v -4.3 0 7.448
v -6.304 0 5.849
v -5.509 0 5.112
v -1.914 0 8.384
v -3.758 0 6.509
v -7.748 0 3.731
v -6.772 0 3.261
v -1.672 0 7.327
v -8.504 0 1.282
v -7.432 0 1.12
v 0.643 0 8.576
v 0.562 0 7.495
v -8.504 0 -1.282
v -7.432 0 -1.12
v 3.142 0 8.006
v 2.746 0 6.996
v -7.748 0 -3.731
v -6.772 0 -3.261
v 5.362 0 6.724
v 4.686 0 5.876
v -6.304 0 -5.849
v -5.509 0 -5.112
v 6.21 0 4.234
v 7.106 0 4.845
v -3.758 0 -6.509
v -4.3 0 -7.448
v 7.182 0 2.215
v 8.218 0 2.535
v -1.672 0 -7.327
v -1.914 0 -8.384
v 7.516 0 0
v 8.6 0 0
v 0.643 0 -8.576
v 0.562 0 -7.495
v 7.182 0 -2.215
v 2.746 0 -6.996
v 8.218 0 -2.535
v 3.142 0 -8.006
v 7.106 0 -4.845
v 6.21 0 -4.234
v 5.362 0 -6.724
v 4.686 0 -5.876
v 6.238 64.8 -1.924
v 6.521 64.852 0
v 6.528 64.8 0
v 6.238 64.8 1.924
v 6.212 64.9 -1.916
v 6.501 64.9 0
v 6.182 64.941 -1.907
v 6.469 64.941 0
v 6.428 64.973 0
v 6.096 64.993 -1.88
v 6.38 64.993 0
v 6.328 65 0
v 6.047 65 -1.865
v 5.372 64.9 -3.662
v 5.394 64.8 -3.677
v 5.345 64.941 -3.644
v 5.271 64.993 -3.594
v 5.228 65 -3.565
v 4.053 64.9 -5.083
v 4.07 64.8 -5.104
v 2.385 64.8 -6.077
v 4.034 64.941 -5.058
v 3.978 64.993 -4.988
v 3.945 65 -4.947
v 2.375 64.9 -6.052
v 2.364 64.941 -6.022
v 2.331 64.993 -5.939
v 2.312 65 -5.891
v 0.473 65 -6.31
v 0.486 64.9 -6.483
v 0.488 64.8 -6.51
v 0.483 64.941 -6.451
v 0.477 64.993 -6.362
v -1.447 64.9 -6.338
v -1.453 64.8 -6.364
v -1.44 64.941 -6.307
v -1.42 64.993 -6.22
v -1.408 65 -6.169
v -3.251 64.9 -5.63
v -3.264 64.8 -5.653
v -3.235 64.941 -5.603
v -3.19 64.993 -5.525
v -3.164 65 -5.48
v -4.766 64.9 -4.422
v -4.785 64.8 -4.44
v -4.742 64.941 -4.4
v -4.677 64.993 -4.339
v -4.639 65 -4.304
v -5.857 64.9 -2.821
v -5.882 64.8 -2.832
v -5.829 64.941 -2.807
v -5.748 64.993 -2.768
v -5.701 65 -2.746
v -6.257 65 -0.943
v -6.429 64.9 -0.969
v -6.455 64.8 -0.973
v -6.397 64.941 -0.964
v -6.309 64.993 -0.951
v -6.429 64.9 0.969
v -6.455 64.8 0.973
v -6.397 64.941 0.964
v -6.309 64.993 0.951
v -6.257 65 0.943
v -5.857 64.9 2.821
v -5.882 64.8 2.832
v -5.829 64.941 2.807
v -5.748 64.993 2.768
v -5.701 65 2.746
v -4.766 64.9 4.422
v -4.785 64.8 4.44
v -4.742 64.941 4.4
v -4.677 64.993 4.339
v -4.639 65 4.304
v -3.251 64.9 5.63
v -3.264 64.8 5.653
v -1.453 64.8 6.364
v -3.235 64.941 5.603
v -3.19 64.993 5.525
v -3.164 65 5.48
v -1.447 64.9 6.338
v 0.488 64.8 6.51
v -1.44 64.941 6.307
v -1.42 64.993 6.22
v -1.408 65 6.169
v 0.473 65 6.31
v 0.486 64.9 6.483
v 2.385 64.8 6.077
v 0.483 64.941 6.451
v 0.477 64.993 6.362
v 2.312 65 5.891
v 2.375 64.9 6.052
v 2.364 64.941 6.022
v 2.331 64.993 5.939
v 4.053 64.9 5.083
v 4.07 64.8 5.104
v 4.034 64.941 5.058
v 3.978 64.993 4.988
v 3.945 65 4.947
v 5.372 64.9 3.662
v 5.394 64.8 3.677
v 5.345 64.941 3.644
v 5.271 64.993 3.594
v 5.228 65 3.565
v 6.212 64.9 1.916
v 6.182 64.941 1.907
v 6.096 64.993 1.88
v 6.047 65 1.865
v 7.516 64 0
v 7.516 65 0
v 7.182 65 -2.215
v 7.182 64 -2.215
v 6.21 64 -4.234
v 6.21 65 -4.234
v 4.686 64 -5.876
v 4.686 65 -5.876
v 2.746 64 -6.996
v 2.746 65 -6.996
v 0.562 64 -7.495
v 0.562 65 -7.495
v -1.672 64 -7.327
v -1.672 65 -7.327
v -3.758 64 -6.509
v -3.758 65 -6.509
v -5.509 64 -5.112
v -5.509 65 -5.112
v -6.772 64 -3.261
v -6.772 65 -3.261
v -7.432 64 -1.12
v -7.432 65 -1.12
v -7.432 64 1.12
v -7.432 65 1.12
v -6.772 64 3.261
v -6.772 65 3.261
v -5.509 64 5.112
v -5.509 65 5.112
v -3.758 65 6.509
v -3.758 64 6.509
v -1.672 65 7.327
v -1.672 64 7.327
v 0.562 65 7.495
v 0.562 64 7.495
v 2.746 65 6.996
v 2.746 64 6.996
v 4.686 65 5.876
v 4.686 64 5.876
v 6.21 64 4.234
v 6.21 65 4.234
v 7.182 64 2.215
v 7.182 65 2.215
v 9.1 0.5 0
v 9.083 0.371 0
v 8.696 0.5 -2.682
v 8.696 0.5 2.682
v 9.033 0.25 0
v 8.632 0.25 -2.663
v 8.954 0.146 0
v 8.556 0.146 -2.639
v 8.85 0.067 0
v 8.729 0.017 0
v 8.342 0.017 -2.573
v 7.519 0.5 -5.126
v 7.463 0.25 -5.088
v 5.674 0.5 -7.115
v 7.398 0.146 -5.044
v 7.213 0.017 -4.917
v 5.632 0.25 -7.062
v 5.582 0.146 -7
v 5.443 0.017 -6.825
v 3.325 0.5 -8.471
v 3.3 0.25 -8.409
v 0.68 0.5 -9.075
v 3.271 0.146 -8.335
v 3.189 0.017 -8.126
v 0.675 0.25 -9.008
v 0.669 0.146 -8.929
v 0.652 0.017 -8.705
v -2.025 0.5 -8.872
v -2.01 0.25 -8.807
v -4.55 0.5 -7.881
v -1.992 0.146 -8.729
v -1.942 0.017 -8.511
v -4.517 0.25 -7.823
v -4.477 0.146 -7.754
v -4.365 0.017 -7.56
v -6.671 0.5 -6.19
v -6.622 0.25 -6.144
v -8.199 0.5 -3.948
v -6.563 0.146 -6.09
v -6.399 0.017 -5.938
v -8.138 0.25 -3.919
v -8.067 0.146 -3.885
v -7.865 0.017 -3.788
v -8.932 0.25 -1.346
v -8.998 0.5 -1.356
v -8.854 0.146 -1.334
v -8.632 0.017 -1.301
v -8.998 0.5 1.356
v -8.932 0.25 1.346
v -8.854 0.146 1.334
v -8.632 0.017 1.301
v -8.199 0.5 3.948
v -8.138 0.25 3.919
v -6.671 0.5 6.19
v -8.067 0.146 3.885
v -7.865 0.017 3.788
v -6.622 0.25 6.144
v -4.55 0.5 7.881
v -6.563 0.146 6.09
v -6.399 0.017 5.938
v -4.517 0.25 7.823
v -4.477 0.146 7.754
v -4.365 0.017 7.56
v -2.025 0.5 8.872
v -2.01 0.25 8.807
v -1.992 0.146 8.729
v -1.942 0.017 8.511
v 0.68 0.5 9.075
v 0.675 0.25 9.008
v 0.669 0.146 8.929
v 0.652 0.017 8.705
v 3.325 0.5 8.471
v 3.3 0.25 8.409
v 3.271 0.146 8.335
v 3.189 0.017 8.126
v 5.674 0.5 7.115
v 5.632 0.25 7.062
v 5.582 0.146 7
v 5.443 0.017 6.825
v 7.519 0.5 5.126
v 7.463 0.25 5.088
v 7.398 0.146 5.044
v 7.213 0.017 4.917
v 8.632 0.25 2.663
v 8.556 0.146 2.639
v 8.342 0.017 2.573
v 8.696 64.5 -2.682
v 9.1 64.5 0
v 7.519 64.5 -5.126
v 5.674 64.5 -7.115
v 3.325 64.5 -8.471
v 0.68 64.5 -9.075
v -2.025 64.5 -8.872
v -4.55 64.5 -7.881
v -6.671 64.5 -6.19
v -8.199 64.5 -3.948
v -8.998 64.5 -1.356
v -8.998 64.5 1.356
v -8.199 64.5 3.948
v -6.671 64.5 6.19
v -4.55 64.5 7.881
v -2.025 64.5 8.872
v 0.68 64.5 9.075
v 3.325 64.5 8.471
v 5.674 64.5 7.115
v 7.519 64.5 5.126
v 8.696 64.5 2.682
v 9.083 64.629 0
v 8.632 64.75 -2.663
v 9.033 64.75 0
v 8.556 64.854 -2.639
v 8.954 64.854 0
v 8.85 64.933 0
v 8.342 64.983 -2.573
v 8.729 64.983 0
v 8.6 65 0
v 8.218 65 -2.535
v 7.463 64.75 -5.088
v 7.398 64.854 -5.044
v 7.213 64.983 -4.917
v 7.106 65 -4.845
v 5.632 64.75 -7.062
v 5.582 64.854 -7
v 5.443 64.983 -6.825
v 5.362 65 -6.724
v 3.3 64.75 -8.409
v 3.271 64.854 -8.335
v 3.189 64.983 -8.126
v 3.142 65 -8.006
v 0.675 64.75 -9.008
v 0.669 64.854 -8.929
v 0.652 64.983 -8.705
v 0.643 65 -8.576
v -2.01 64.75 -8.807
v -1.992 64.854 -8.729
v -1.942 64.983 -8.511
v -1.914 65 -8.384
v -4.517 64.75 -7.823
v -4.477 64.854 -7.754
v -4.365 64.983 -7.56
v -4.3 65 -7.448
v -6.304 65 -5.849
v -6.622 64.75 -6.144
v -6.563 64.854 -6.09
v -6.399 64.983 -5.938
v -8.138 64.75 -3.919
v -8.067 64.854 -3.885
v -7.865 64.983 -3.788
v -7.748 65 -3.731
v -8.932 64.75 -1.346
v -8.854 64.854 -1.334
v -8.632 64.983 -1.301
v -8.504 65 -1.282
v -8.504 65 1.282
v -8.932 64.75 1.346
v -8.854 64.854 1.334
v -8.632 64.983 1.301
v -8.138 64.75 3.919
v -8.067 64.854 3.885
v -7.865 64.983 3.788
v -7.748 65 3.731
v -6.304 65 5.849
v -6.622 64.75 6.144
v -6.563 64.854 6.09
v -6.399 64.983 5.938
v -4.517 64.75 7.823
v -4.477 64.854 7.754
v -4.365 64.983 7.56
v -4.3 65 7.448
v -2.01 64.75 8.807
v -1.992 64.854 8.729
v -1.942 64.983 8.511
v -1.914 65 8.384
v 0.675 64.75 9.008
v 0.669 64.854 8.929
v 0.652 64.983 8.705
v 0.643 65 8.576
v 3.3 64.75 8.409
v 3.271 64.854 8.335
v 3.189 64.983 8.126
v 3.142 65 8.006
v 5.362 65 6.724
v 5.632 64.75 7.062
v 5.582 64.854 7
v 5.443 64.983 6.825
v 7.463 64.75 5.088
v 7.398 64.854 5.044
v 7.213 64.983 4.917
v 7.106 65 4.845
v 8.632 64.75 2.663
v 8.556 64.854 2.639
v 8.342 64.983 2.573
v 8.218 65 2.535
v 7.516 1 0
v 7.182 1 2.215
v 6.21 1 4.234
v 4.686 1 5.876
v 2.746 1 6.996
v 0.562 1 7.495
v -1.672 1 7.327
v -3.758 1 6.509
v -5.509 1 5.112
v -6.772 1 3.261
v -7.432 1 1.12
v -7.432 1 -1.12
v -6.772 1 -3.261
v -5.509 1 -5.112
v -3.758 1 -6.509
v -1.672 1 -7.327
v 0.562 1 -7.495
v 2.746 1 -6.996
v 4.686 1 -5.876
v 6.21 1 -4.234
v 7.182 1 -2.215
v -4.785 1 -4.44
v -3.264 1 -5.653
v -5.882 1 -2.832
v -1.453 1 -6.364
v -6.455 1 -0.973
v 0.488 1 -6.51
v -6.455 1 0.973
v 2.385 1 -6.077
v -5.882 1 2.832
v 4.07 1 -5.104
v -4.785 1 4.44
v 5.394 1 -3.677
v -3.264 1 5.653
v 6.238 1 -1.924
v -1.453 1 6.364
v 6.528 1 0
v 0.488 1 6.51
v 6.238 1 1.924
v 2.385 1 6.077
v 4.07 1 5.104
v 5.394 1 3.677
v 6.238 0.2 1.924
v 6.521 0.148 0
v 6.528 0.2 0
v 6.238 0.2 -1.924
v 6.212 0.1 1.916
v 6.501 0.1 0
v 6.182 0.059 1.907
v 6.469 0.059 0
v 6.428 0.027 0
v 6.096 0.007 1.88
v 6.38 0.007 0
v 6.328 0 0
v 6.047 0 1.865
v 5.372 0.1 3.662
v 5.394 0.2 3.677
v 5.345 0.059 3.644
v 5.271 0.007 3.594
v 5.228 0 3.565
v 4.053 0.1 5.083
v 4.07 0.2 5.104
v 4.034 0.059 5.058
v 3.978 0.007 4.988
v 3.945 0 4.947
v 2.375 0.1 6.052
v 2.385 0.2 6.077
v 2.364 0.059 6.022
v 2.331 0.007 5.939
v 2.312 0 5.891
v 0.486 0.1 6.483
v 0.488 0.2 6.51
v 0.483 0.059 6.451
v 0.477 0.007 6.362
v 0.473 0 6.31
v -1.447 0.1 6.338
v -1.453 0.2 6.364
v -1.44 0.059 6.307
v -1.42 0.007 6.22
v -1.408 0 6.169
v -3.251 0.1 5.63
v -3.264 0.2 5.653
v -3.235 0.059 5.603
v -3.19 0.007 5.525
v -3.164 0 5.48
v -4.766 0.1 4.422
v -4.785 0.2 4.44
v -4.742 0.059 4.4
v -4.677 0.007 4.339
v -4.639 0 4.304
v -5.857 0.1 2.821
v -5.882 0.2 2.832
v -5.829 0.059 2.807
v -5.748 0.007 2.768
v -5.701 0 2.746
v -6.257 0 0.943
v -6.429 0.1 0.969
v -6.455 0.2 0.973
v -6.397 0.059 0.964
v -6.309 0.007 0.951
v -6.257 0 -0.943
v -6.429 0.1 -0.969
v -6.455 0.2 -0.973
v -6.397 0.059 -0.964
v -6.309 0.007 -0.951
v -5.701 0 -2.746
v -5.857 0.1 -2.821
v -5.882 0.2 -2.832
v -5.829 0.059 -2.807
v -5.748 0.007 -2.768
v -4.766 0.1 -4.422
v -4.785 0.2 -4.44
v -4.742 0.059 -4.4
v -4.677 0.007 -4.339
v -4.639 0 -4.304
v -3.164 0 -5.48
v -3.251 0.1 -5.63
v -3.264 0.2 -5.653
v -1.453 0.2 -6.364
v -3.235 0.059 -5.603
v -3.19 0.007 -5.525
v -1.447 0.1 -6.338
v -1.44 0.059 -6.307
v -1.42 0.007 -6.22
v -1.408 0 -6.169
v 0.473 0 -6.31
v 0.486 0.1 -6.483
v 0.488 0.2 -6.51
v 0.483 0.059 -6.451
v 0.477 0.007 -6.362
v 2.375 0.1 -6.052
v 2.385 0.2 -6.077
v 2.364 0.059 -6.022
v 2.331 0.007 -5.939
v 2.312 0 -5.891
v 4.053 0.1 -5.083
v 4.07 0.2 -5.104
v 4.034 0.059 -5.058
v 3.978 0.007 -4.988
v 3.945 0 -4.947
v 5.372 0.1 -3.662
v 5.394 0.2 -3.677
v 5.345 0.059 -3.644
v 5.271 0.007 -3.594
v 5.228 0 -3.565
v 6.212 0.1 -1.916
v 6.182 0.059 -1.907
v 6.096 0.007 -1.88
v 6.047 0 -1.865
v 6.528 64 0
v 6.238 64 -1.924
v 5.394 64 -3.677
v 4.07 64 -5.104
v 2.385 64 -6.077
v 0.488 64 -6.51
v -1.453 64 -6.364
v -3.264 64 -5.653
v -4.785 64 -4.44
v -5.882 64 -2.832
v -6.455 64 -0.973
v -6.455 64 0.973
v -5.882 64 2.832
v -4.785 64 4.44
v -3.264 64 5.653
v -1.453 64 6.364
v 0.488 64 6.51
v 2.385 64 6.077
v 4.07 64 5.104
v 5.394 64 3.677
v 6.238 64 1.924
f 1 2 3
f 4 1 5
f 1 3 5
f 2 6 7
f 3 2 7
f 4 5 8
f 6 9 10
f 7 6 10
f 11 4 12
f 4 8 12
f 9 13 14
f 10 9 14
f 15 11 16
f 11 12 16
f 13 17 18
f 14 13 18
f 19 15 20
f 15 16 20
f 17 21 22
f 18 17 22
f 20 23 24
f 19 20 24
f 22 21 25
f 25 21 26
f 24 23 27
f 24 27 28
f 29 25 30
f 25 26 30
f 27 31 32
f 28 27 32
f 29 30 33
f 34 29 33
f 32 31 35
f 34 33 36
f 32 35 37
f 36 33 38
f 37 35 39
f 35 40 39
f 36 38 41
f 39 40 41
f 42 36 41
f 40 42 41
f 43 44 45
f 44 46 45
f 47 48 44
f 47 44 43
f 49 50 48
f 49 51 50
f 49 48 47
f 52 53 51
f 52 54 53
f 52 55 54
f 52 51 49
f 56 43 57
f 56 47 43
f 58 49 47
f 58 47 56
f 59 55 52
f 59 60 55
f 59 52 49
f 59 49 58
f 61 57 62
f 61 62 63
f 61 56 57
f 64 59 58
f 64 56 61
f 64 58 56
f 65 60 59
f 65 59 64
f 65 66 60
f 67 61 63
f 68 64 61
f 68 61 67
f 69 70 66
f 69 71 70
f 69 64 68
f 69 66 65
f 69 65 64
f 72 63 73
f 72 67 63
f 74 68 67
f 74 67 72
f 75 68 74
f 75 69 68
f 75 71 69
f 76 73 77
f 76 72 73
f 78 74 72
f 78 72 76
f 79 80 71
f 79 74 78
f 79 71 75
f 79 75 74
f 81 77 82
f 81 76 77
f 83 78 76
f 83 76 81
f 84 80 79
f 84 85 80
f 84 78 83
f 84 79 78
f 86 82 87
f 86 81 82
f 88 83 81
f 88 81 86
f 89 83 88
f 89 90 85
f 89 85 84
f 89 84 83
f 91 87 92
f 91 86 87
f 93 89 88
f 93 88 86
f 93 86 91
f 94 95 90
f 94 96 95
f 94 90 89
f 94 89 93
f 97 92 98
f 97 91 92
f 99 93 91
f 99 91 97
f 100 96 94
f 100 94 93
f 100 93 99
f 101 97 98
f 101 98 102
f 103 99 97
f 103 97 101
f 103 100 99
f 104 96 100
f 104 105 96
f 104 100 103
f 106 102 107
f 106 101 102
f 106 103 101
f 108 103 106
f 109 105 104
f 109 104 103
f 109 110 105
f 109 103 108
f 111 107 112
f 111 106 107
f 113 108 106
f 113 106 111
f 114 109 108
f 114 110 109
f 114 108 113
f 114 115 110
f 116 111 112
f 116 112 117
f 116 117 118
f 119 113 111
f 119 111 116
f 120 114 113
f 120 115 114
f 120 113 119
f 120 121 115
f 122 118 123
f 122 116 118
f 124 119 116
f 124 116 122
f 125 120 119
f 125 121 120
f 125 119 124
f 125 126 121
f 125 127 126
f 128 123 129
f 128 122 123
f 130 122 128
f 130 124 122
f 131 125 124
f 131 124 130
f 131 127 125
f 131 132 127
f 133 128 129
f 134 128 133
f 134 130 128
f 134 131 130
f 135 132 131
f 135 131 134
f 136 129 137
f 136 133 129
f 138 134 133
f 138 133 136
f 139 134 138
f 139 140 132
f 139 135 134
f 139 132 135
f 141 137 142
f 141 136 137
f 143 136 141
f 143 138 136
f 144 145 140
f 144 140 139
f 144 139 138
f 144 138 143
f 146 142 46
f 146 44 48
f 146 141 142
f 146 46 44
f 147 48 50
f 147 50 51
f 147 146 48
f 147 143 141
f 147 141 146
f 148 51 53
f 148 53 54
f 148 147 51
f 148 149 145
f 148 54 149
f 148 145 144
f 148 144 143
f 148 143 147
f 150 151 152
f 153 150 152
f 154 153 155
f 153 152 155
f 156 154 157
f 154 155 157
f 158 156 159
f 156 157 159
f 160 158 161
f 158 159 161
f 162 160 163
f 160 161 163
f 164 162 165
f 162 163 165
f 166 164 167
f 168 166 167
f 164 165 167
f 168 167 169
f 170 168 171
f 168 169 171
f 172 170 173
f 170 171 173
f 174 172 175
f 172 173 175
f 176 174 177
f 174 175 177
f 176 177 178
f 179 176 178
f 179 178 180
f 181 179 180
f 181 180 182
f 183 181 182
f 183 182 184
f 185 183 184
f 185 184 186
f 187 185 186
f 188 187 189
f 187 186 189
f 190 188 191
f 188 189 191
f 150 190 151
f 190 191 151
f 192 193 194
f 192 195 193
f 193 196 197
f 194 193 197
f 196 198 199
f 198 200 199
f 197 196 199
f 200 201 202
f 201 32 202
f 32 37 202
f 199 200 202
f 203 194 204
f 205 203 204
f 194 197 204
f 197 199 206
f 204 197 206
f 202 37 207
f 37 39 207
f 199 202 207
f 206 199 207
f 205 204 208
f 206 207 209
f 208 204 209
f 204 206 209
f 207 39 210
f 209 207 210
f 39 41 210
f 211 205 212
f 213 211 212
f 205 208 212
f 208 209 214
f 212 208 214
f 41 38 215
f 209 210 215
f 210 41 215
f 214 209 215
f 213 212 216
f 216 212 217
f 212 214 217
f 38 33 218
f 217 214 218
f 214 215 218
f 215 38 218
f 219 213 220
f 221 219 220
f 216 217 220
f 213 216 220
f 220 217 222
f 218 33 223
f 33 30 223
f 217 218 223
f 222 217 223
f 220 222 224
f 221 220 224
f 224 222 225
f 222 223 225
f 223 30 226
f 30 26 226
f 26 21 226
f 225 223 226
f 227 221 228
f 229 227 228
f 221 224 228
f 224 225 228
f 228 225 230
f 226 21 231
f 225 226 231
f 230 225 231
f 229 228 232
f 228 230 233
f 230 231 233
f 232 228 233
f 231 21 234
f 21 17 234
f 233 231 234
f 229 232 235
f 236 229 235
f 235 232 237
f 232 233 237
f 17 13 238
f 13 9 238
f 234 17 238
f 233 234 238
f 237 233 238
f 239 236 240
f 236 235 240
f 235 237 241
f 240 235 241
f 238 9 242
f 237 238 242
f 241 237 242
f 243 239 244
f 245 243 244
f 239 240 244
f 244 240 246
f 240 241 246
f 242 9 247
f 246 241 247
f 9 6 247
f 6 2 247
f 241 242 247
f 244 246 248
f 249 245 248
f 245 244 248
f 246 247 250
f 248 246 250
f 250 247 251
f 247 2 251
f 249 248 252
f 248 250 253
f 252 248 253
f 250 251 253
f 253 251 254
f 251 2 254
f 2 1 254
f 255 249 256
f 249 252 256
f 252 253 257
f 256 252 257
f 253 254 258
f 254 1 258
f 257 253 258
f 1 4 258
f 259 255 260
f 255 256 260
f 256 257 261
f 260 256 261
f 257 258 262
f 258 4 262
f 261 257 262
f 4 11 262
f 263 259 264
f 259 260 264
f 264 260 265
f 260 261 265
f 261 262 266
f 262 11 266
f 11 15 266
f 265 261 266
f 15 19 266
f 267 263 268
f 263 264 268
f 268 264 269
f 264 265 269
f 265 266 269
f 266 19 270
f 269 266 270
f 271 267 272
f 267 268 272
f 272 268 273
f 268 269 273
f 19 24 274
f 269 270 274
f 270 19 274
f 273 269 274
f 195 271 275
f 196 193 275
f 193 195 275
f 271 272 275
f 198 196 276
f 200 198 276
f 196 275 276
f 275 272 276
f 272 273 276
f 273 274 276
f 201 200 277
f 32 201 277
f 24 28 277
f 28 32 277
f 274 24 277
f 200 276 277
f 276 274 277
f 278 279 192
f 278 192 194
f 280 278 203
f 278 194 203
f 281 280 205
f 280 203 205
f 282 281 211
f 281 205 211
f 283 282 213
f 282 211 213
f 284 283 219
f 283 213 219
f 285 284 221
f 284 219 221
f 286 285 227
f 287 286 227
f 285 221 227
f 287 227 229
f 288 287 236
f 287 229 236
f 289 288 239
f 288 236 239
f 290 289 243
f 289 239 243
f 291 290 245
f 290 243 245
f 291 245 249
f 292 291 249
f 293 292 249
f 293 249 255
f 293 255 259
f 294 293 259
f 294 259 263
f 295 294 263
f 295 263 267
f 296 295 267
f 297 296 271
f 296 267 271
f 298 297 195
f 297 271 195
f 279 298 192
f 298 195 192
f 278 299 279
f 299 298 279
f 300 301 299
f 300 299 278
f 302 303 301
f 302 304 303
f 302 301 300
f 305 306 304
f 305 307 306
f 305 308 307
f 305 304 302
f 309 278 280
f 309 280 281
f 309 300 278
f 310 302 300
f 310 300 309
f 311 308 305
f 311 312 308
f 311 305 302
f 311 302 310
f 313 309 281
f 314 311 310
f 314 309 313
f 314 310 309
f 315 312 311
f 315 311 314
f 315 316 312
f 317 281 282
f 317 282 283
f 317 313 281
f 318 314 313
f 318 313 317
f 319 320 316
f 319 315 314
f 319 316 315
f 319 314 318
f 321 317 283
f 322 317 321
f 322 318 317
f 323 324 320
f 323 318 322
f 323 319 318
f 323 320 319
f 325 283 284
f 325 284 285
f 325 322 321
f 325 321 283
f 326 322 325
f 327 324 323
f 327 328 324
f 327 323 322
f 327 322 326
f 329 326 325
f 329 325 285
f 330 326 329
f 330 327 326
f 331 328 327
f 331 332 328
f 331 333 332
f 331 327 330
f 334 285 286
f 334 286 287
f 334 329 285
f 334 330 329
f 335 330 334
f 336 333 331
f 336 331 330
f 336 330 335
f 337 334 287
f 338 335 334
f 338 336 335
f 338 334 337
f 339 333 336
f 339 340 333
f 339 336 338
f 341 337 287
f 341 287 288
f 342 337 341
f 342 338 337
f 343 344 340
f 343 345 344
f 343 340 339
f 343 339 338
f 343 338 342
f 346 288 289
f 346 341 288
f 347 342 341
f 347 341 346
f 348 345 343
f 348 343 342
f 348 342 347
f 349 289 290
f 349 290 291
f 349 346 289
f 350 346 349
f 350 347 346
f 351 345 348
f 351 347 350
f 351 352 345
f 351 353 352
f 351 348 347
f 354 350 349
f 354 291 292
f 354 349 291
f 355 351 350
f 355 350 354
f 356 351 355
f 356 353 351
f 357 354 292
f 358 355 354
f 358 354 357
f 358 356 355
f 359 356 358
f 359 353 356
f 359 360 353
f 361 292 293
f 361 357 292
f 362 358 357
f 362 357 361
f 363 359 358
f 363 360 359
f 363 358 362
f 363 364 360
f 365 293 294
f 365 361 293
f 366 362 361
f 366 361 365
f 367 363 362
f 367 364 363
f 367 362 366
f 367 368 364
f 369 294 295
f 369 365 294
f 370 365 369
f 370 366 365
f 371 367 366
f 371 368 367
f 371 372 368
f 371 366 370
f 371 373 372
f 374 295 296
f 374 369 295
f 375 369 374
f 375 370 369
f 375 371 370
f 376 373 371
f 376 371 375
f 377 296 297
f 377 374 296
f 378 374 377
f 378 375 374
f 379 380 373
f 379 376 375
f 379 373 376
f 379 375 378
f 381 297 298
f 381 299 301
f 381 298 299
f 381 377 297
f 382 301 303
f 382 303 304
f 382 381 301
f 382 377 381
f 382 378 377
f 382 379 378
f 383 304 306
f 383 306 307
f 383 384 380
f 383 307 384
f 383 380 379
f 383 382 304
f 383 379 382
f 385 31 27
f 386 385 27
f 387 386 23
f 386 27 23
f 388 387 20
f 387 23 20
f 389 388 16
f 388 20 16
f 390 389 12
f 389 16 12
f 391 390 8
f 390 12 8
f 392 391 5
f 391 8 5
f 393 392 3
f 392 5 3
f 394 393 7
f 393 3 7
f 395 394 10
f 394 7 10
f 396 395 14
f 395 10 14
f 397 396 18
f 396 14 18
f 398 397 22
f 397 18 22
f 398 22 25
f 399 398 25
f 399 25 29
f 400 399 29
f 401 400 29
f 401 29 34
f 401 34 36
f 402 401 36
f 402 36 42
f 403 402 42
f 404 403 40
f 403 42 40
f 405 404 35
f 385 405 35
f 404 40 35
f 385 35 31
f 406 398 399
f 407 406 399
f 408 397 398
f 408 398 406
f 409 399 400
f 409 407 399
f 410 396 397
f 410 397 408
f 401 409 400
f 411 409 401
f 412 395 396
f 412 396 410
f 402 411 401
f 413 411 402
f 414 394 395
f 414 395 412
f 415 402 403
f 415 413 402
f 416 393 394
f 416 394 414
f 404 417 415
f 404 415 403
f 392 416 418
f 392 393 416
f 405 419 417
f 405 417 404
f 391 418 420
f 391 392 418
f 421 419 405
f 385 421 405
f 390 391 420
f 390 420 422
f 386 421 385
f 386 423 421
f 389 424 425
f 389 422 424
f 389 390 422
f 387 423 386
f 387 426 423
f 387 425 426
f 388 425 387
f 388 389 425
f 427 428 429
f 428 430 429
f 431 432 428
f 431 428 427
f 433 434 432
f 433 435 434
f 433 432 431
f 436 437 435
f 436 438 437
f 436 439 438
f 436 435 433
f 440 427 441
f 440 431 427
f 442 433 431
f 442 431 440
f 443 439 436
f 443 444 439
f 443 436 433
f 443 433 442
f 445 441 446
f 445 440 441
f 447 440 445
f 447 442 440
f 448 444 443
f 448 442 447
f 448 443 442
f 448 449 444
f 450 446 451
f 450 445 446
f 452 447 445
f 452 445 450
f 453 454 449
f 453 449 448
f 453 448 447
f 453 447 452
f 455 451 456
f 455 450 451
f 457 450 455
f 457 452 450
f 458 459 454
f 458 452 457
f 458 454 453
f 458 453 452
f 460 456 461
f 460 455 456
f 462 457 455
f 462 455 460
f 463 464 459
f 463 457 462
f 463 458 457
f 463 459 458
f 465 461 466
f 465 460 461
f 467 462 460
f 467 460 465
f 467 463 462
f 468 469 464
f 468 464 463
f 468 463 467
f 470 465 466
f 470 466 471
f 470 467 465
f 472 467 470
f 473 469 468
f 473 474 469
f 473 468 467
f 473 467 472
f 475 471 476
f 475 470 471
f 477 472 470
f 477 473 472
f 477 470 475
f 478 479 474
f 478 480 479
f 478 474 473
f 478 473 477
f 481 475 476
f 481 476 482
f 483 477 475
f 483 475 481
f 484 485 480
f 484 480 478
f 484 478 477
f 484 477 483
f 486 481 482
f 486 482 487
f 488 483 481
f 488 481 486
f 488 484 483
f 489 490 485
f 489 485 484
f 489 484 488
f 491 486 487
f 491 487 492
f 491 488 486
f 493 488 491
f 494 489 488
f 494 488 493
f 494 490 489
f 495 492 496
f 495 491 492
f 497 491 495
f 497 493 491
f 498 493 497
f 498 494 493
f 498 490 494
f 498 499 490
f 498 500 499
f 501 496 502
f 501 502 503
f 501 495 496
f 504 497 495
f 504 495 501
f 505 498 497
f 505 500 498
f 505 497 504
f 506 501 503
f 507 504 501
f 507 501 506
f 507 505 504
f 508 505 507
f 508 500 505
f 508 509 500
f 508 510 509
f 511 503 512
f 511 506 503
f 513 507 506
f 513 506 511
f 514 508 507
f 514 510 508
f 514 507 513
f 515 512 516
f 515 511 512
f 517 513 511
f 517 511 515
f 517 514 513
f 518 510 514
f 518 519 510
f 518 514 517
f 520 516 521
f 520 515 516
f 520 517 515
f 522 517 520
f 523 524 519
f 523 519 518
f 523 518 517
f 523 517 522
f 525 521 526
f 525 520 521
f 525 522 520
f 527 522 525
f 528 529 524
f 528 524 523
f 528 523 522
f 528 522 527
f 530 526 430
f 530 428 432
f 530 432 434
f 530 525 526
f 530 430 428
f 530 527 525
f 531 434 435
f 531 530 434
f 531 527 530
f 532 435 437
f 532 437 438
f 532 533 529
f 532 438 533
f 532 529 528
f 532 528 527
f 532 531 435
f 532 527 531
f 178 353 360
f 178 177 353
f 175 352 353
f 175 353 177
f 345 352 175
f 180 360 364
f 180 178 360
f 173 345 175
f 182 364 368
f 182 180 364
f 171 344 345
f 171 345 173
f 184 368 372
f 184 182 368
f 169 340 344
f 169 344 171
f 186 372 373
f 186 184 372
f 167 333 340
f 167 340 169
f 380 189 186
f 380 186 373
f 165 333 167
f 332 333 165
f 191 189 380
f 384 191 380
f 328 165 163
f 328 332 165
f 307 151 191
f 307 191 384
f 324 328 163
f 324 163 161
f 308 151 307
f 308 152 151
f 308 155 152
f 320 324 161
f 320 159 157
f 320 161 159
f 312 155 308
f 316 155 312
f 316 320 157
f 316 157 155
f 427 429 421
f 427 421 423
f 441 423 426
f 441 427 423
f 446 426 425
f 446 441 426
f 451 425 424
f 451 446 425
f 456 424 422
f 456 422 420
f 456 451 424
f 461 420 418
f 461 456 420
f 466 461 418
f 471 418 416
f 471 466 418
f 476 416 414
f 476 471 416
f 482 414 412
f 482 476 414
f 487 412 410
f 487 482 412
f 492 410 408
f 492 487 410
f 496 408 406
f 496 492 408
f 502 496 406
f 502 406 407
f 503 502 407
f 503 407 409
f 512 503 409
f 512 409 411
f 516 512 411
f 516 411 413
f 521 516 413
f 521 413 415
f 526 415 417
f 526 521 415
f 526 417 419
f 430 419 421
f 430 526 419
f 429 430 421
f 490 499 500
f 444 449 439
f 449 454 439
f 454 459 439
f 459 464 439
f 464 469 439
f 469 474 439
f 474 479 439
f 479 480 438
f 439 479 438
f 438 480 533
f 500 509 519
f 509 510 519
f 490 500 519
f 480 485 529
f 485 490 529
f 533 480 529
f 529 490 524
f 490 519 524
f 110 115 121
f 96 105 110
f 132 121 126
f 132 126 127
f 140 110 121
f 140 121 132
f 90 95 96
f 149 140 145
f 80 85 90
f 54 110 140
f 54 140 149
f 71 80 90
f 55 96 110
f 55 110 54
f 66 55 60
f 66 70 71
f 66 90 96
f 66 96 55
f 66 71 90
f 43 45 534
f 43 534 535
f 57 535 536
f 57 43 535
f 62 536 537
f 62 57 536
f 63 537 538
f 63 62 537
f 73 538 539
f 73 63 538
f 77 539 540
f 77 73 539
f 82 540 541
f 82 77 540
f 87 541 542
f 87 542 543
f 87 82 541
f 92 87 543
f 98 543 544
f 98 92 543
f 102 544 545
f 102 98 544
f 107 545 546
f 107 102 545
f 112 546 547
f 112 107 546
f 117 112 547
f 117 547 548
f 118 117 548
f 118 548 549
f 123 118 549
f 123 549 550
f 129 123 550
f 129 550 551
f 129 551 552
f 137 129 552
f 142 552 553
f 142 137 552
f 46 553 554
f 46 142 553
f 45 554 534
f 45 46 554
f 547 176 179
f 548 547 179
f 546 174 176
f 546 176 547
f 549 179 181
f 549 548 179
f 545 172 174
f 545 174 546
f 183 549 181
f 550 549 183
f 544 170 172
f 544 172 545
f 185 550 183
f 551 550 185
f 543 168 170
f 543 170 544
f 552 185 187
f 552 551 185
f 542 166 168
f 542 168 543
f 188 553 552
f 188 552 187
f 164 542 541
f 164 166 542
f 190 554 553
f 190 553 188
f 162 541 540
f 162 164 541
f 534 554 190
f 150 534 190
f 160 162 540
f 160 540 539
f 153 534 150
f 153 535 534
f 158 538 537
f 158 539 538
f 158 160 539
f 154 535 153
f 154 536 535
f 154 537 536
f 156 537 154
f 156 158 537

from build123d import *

# Parameters (mm, degrees)
SKETCH1_R           = 9.1
BOSS_EXTRUDE1_DEPTH = 65
SKETCH2_R           = 7.515816548
SKETCH2_R_2         = 6.528062022
CUT_EXTRUDE1_DEPTH  = 1
FILLET1_R           = 0.5
SKETCH3_R           = 7.515816548
SKETCH3_R_2         = 6.528062022
CUT_EXTRUDE2_DEPTH  = 1
FILLET2_R           = 0.2


with BuildPart() as part:
    # Sketch1 → Boss-Extrude1 (new body)
    with BuildSketch(Plane(origin=(0, 0, 0), x_dir=(1, 0, 0), z_dir=(0, 1, 0))):
        Circle(SKETCH1_R)
    extrude(amount=BOSS_EXTRUDE1_DEPTH)

    # Sketch2 → Cut-Extrude1 (cut)
    with BuildSketch(Plane(origin=(0, 65, 0), x_dir=(1, 0, 0), z_dir=(0, 1, 0))):
        Circle(SKETCH2_R)
        Circle(SKETCH2_R_2, mode=Mode.SUBTRACT)
    extrude(amount=-CUT_EXTRUDE1_DEPTH, mode=Mode.SUBTRACT)

    # Fillet1
    fillet1_edges = [part.edges().sort_by_distance(p)[0] for p in [
        (-9.1, 0, 0),
        (-9.1, 65, 0),
    ]]
    fillet(fillet1_edges, radius=FILLET1_R)

    # Sketch3 → Cut-Extrude2 (cut)
    with BuildSketch(Plane.XZ):
        Circle(SKETCH3_R)
        Circle(SKETCH3_R_2, mode=Mode.SUBTRACT)
    extrude(amount=-CUT_EXTRUDE2_DEPTH, mode=Mode.SUBTRACT)

    # Fillet2
    fillet2_edges = [part.edges().sort_by_distance(p)[0] for p in [
        (-6.528062022, 0, 0),
        (-6.528062022, 65, 0),
    ]]
    fillet(fillet2_edges, radius=FILLET2_R)


solid = part.part
